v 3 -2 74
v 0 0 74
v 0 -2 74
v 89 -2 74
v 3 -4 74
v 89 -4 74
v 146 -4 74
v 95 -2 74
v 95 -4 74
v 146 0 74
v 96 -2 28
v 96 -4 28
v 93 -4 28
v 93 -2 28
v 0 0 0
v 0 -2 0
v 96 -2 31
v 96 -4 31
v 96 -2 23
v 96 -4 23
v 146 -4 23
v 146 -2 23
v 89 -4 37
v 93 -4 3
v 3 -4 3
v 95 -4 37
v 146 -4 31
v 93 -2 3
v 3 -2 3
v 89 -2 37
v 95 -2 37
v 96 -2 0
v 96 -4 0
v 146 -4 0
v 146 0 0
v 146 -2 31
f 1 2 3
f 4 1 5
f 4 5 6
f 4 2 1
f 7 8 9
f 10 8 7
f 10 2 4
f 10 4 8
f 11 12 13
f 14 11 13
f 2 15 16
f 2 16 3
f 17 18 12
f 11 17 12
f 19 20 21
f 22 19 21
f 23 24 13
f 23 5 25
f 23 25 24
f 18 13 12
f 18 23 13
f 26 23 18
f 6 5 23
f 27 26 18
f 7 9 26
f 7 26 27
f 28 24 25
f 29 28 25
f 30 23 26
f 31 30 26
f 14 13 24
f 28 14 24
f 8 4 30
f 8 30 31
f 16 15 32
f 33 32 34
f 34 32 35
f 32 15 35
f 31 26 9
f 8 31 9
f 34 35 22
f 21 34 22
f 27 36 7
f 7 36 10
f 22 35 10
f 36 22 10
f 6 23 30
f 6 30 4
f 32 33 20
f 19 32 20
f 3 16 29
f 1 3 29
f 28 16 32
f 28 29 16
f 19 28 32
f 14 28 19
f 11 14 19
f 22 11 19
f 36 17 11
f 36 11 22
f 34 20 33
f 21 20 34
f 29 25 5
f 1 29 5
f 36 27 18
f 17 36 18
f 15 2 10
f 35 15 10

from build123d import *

# Parameters (mm, degrees)
F0_W     = 146
F0_H     = 74
F1_DEPTH = 4
F3_DEPTH = 2
F2_W     = 6
F2_H     = 37
F4_DEPTH = 2
F5_DEPTH = 2


with BuildPart() as f1:
    # F0 (on Front) → F1 (new body)
    with BuildSketch(Plane.XZ):
        with Locations((73, 37)):
            Rectangle(F0_W, F0_H)
    extrude(amount=F1_DEPTH)

    # F2 (on face) → F3 (cut)
    with BuildSketch(Plane.XZ.offset(4)):
        Polygon((3, 3), (3, 74), (0, 74), (0, 0), (96, 0), (96, 23), (93, 23), (93, 3), align=None)
    extrude(amount=-F3_DEPTH, mode=Mode.SUBTRACT)

    # F2 (on face) → F4 (cut)
    with BuildSketch(Plane.XZ.offset(4)):
        with Locations((92, 55.5)):
            Rectangle(F2_W, F2_H)
    extrude(amount=-F4_DEPTH, mode=Mode.SUBTRACT)

    # F2 (on face) → F5 (cut)
    with BuildSketch(Plane.XZ.offset(4)):
        Polygon((93, 28), (93, 23), (96, 23), (146, 23), (146, 31), (96, 31), (96, 28), align=None)
    extrude(amount=-F5_DEPTH, mode=Mode.SUBTRACT)


solid = f1.part
